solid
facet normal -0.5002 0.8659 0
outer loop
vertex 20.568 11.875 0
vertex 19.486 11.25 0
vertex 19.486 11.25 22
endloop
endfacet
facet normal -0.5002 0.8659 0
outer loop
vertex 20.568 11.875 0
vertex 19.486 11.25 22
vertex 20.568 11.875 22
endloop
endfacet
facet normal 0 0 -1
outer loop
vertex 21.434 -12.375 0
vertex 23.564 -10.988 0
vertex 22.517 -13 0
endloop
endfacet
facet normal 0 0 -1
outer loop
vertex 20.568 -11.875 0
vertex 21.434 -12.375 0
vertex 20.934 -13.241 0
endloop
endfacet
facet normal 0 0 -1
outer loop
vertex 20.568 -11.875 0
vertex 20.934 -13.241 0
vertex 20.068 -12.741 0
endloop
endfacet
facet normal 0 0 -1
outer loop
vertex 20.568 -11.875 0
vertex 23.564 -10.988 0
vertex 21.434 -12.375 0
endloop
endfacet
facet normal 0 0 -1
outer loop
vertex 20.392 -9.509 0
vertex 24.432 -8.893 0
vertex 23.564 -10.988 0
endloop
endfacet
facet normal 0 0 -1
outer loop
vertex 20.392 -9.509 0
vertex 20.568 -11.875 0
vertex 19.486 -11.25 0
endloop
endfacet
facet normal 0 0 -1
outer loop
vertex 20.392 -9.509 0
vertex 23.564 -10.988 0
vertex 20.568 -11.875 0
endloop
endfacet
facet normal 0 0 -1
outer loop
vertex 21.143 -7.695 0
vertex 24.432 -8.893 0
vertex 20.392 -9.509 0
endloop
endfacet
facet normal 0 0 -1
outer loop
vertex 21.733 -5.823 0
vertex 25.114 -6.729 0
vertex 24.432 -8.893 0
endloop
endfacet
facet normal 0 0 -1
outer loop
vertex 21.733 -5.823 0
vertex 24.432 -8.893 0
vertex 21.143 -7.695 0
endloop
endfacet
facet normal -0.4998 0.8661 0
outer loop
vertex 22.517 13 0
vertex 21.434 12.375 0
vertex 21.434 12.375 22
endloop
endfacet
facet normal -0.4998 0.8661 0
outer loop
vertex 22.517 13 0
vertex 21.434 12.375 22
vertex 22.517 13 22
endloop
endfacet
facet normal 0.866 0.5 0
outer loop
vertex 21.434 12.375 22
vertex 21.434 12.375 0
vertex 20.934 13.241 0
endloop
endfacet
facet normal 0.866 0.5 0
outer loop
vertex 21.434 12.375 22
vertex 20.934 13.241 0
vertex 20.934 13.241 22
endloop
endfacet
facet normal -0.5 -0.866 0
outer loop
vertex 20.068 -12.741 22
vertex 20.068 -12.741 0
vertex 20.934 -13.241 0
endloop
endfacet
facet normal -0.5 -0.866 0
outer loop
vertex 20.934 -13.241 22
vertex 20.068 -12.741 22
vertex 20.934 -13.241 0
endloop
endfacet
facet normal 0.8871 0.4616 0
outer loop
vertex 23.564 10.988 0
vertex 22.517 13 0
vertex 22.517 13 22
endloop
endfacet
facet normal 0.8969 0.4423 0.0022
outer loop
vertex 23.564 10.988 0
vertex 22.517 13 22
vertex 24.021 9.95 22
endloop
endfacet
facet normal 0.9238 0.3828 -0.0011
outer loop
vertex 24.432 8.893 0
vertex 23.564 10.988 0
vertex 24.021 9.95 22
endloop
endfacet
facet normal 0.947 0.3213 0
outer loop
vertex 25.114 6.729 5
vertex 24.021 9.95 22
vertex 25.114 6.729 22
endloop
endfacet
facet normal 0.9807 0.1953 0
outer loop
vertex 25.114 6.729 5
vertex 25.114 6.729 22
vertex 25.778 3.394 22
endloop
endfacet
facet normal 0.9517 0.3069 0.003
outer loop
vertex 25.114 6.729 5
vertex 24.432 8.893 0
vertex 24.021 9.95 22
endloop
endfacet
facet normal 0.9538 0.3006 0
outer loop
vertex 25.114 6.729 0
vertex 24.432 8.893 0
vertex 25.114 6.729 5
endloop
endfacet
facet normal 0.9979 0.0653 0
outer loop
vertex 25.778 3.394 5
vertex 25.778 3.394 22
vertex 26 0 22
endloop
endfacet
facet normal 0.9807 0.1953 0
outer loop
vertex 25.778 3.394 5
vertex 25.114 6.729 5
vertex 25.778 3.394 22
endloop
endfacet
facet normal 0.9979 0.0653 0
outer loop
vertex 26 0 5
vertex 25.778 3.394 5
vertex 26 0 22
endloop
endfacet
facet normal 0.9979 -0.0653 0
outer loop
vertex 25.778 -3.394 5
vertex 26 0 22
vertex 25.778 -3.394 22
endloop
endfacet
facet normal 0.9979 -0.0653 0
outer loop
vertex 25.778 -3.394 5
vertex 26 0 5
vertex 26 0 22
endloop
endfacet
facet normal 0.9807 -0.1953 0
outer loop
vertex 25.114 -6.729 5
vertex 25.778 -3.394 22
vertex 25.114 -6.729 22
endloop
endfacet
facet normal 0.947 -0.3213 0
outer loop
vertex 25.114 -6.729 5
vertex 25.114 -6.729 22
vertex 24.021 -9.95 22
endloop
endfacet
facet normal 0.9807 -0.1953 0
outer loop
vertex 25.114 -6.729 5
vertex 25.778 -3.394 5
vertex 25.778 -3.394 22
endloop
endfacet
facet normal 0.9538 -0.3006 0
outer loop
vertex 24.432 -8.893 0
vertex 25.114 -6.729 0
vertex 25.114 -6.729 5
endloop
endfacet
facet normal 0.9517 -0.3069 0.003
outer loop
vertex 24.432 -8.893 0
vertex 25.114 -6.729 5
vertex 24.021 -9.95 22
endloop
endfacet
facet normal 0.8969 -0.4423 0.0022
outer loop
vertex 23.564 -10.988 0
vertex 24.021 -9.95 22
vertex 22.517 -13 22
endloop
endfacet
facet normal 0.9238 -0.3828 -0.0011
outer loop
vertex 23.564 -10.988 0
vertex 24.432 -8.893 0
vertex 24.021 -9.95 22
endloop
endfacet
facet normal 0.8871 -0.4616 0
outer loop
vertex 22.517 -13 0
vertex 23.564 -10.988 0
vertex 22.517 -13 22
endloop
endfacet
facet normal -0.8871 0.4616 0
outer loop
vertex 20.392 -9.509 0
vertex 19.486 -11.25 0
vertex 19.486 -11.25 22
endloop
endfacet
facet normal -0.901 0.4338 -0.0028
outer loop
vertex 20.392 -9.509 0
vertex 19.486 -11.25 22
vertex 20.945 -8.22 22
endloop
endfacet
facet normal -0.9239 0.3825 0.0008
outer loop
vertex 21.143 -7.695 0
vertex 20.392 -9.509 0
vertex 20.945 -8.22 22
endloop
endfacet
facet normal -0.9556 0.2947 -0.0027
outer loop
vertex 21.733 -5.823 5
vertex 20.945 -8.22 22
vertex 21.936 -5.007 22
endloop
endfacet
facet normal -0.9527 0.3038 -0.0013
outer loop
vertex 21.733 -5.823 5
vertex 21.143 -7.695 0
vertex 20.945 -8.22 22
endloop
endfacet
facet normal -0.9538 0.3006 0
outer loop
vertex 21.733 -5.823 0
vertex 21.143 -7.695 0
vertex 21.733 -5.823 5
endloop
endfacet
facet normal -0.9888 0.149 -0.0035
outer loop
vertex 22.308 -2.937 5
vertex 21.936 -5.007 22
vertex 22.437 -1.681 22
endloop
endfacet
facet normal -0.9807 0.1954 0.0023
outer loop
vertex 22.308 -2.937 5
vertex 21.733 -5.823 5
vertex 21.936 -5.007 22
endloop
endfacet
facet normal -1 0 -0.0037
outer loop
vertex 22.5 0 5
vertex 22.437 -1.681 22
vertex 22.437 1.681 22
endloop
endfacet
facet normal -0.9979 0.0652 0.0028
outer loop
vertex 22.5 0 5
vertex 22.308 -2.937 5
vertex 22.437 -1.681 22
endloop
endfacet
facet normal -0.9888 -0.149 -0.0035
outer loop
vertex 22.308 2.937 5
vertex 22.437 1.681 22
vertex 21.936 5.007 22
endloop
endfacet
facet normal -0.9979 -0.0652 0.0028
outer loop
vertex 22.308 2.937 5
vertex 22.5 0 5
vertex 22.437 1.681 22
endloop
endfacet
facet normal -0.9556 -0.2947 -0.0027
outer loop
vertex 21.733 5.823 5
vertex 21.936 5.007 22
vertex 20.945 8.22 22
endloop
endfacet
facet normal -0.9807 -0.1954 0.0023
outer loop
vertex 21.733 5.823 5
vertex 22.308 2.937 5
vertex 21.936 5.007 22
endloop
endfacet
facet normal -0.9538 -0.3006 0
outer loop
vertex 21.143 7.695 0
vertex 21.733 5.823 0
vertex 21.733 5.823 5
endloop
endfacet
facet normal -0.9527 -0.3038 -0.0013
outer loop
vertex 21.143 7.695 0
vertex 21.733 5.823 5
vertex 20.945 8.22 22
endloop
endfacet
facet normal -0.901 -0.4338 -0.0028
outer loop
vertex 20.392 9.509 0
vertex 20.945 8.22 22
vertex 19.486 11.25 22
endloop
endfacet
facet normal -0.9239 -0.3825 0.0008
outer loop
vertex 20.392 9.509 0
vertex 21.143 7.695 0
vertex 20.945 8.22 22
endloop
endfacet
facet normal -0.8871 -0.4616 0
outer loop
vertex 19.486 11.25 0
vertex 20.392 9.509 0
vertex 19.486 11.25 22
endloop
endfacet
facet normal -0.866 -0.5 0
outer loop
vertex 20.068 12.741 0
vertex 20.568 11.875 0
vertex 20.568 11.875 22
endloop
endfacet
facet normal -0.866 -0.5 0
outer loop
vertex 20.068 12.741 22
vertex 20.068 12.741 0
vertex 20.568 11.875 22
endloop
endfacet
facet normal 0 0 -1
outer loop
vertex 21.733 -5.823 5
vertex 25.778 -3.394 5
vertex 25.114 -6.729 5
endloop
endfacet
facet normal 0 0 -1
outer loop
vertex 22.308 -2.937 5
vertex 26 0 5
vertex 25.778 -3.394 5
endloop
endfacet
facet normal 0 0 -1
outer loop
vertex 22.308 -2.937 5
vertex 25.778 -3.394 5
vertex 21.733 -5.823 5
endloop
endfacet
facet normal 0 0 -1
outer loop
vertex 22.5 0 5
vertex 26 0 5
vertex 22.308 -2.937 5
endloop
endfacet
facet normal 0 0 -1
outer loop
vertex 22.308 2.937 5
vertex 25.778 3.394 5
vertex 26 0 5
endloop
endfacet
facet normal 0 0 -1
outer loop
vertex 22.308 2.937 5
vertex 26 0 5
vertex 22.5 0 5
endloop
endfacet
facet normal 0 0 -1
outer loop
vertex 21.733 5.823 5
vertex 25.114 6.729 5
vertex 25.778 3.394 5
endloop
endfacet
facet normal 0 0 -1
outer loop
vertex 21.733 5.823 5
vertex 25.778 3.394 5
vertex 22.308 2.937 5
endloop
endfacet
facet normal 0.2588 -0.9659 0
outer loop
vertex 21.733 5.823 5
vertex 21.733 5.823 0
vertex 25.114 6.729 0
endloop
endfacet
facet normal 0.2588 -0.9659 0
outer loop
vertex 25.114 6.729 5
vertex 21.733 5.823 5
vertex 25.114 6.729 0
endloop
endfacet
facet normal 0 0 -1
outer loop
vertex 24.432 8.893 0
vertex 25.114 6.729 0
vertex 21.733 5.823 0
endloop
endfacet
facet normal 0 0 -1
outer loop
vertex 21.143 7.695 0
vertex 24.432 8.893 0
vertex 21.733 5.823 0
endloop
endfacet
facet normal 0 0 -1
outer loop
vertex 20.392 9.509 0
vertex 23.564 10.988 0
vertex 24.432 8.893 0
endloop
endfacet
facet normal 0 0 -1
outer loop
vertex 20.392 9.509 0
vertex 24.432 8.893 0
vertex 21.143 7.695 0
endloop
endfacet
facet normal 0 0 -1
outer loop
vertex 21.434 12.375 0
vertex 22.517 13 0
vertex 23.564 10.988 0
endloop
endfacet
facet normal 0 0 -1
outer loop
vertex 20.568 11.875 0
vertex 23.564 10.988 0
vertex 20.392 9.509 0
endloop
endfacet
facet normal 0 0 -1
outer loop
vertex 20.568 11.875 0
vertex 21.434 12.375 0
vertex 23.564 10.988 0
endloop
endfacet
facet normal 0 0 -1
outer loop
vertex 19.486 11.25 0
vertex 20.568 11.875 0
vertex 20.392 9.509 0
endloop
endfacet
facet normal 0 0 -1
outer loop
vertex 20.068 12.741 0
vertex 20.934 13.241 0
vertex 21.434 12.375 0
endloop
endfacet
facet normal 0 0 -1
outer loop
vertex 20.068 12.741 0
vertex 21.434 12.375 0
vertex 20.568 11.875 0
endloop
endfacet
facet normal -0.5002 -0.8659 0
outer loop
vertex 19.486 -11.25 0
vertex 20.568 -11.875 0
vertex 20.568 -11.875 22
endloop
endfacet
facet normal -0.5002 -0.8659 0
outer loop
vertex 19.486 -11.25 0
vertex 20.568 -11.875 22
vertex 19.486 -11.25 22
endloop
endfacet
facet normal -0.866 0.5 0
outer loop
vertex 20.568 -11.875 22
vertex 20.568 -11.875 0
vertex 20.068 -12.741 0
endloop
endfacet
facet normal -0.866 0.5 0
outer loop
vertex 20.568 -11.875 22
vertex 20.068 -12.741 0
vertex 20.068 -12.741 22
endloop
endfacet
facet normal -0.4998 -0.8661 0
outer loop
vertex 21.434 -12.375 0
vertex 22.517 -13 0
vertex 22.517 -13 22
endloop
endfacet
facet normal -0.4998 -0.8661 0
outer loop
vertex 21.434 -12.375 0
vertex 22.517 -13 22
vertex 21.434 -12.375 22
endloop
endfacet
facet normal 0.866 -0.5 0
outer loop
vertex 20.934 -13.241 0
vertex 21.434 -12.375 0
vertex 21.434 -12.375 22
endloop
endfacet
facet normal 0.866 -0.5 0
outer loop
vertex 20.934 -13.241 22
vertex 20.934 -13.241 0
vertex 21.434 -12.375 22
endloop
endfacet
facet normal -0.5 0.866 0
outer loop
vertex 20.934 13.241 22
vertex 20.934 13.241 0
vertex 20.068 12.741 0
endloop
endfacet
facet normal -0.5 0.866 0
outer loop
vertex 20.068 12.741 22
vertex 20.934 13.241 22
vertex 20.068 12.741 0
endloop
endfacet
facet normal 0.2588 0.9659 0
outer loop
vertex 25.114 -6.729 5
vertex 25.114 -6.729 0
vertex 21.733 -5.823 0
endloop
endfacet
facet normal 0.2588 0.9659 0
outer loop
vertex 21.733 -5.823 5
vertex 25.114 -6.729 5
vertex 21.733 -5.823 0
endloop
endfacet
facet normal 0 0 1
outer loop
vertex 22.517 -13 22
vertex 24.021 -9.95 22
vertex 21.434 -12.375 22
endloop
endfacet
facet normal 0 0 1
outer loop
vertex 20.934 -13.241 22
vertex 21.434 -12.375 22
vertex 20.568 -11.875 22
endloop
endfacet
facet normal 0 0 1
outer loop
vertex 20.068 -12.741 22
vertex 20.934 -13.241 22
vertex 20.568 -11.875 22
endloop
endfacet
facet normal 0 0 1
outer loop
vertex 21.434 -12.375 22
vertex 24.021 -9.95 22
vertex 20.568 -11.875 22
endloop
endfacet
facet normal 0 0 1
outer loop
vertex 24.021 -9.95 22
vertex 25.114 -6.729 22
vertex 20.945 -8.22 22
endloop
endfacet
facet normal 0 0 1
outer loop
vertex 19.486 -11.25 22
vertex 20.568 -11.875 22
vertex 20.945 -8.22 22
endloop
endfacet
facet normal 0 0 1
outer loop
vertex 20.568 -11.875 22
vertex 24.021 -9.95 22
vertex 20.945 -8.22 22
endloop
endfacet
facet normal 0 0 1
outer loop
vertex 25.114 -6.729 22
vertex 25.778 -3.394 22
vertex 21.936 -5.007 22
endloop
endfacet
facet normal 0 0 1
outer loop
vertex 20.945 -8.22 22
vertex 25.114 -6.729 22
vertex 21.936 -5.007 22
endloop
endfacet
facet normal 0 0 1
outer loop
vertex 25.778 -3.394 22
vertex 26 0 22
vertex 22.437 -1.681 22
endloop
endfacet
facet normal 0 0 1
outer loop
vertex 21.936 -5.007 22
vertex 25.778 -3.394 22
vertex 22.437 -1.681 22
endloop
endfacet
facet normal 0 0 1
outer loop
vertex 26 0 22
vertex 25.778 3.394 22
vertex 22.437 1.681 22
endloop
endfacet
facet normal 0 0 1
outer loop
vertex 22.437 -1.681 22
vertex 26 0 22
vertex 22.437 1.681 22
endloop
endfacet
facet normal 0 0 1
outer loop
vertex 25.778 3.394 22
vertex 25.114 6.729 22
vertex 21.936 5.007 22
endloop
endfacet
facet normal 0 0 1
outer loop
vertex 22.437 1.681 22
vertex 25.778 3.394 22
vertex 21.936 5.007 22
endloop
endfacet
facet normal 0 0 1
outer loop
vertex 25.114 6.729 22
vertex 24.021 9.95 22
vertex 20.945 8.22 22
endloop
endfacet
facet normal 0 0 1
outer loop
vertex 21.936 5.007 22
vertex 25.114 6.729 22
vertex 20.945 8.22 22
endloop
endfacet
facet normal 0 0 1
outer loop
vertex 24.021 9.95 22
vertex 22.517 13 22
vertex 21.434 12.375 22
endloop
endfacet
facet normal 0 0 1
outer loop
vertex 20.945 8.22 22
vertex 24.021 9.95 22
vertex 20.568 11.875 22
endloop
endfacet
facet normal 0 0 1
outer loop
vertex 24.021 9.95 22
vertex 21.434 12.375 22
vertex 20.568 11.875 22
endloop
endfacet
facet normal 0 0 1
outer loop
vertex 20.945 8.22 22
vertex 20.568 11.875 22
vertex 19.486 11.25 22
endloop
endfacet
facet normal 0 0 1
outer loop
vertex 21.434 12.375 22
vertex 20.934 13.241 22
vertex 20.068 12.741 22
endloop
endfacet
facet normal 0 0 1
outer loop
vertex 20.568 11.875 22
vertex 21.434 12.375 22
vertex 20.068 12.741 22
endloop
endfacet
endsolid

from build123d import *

# Parameters (mm, degrees)
EXTRUDE_1_DEPTH     = 22
SKETCH_4_W          = 1
SKETCH_4_H          = 22
EXTRUDE_2_DEPTH     = 1
SKETCH_2_W          = 1
SKETCH_2_H          = 22
EXTRUDE_3_DEPTH     = 1
CUT_EXTRUDE_2_DEPTH = 5


with BuildPart() as part:
    # Эскиз1 → Бобышка-Вытянуть1 (new body)
    with BuildSketch(Plane.XY):
        with BuildLine():
            Line((19.485571585, 11.25), (22.516660498, 13))
            ThreePointArc((22.516660498, 13), (26, 0), (22.516660498, -13))
            Line((22.516660498, -13), (19.485571585, -11.25))
            ThreePointArc((19.485571585, -11.25), (22.5, 0), (19.485571585, 11.25))
        make_face()
    extrude(amount=EXTRUDE_1_DEPTH)

    # Эскиз4 → Бобышка-Вытянуть2 (add)
    with BuildSketch(Plane(origin=(0, 0, 0), x_dir=(-0.866025403784438, -0.5000000000000012, 0), z_dir=(-0.5000000000000011, 0.8660254037844379, 0))):
        with Locations((-24.25, 11)):
            Rectangle(SKETCH_4_W, SKETCH_4_H)
    extrude(amount=EXTRUDE_2_DEPTH)

    # Эскиз2 → Бобышка-Вытянуть3 (add)
    with BuildSketch(Plane(origin=(0, 0, 0), x_dir=(0.866025403784438, -0.5000000000000012, 0), z_dir=(-0.5000000000000011, -0.8660254037844379, 0))):
        with Locations((24.25, 11)):
            Rectangle(SKETCH_2_W, SKETCH_2_H)
    extrude(amount=EXTRUDE_3_DEPTH)

    # Эскиз6 → Вырез-Вытянуть2 (cut)
    with BuildSketch(Plane(origin=(0, 0, 0), x_dir=(-1, 0, 0), z_dir=(0, 0, -1))):
        with BuildLine():
            Line((-21.733331092, 5.823428515), (-25.114071484, 6.729295173))
            ThreePointArc((-25.114071484, 6.729295173), (-26, 0), (-25.114071484, -6.729295173))
            Line((-25.114071484, -6.729295173), (-21.733331092, -5.823428515))
            ThreePointArc((-21.733331092, -5.823428515), (-22.5, 0), (-21.733331092, 5.823428515))
        make_face()
    extrude(amount=-CUT_EXTRUDE_2_DEPTH, mode=Mode.SUBTRACT)


solid = part.part
